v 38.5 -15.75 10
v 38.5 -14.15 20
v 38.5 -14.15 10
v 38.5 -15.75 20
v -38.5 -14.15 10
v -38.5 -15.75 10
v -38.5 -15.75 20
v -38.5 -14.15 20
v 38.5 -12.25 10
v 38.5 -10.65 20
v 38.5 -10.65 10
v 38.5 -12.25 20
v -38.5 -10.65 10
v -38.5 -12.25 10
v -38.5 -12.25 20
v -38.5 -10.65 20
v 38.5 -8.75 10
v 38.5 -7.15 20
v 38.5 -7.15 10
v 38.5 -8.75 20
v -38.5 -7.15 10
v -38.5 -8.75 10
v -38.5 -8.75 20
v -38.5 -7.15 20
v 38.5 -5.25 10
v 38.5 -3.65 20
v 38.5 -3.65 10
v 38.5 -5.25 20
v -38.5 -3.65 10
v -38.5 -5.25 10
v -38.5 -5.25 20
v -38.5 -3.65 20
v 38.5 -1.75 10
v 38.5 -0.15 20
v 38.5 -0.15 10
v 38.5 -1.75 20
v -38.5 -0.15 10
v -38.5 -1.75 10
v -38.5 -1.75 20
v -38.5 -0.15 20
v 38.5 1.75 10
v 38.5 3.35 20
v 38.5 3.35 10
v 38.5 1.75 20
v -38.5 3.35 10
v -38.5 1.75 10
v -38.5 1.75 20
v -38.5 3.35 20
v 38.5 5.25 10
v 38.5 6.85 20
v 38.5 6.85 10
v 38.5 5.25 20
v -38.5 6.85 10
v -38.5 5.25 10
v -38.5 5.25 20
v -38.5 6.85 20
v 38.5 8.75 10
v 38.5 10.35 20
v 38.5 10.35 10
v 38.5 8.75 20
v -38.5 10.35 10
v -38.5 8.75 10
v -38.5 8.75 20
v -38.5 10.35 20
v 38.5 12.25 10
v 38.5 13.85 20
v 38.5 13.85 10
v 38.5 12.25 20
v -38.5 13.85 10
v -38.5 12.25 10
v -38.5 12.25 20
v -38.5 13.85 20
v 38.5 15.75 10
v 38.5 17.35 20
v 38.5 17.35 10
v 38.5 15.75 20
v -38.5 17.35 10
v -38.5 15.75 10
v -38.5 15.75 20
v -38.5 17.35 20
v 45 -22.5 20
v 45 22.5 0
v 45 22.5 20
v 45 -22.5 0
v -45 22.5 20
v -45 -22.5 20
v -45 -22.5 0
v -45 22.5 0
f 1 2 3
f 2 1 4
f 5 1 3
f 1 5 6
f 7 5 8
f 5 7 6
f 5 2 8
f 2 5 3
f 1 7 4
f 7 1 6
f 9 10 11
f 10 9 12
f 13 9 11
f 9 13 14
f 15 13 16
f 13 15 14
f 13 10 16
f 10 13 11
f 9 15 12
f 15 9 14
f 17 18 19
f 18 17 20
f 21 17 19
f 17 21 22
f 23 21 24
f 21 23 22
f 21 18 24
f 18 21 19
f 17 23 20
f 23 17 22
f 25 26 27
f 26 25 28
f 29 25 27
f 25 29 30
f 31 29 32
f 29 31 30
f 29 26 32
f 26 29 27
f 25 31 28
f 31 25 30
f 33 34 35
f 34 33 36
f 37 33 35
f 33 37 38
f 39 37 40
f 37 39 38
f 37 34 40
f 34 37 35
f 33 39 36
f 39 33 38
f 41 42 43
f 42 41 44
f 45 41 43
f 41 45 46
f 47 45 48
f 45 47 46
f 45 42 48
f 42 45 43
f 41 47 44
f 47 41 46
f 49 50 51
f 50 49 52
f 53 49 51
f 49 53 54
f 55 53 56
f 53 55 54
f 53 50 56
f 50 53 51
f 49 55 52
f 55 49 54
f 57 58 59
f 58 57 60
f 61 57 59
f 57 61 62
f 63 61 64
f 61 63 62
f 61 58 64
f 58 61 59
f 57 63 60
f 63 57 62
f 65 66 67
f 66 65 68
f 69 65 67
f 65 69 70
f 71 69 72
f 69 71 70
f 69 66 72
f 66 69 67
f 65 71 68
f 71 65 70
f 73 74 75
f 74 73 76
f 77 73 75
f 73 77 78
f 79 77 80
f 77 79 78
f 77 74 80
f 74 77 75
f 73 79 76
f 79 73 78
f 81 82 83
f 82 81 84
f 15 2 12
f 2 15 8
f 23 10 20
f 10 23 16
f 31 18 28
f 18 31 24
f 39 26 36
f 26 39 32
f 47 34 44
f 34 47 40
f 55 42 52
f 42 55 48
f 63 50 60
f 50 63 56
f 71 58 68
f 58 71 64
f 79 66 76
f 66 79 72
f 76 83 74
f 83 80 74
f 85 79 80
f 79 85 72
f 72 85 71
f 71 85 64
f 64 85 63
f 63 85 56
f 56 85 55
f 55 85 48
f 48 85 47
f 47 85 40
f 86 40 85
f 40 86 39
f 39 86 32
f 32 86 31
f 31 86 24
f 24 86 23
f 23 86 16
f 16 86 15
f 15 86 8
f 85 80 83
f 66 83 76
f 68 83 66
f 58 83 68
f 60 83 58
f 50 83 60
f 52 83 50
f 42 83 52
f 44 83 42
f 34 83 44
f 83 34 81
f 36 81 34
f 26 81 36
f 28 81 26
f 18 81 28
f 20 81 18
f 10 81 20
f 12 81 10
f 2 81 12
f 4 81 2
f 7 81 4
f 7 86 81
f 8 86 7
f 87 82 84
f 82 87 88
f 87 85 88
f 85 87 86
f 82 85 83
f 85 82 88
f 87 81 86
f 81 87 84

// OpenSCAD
// Microscope slide drying rack
// Print orientation: base on XY plane, slots open upward (+Z)

// ---------- Parameters ----------
block_len      = 90;    // block length along X (mm)
block_wid      = 45;    // block width along Y (mm)
block_ht       = 20;    // block height along Z (mm)

slot_count     = 10;    // number of slide slots
slot_len       = 77;    // slot length along X (mm)
slot_wid       = 1.6;   // slot width along Y (mm)
slot_depth     = 10;    // slot depth from top face (mm)
slot_pitch     = 3.5;   // centre-to-centre slot spacing in Y (mm)

eps            = 0.5;   // overcut past faces to avoid coplanar surfaces (mm)

$fn = 64;

// ---------- Derived ----------
slot_x0 = -slot_len / 2;              // first slot start in X
slot_y0 = -(slot_count - 1) * slot_pitch / 2;  // first slot centre in Y (group centred)

// ---------- Model ----------
difference() {
    // Base block
    translate([-block_len / 2, -block_wid / 2, 0])
        cube([block_len, block_wid, block_ht]);

    // Parallel slots, open at the top
    for (i = [0 : slot_count - 1]) {
        translate([slot_x0, slot_y0 + i * slot_pitch, block_ht - slot_depth])
            cube([slot_len, slot_wid, slot_depth + eps]);
    }
}
